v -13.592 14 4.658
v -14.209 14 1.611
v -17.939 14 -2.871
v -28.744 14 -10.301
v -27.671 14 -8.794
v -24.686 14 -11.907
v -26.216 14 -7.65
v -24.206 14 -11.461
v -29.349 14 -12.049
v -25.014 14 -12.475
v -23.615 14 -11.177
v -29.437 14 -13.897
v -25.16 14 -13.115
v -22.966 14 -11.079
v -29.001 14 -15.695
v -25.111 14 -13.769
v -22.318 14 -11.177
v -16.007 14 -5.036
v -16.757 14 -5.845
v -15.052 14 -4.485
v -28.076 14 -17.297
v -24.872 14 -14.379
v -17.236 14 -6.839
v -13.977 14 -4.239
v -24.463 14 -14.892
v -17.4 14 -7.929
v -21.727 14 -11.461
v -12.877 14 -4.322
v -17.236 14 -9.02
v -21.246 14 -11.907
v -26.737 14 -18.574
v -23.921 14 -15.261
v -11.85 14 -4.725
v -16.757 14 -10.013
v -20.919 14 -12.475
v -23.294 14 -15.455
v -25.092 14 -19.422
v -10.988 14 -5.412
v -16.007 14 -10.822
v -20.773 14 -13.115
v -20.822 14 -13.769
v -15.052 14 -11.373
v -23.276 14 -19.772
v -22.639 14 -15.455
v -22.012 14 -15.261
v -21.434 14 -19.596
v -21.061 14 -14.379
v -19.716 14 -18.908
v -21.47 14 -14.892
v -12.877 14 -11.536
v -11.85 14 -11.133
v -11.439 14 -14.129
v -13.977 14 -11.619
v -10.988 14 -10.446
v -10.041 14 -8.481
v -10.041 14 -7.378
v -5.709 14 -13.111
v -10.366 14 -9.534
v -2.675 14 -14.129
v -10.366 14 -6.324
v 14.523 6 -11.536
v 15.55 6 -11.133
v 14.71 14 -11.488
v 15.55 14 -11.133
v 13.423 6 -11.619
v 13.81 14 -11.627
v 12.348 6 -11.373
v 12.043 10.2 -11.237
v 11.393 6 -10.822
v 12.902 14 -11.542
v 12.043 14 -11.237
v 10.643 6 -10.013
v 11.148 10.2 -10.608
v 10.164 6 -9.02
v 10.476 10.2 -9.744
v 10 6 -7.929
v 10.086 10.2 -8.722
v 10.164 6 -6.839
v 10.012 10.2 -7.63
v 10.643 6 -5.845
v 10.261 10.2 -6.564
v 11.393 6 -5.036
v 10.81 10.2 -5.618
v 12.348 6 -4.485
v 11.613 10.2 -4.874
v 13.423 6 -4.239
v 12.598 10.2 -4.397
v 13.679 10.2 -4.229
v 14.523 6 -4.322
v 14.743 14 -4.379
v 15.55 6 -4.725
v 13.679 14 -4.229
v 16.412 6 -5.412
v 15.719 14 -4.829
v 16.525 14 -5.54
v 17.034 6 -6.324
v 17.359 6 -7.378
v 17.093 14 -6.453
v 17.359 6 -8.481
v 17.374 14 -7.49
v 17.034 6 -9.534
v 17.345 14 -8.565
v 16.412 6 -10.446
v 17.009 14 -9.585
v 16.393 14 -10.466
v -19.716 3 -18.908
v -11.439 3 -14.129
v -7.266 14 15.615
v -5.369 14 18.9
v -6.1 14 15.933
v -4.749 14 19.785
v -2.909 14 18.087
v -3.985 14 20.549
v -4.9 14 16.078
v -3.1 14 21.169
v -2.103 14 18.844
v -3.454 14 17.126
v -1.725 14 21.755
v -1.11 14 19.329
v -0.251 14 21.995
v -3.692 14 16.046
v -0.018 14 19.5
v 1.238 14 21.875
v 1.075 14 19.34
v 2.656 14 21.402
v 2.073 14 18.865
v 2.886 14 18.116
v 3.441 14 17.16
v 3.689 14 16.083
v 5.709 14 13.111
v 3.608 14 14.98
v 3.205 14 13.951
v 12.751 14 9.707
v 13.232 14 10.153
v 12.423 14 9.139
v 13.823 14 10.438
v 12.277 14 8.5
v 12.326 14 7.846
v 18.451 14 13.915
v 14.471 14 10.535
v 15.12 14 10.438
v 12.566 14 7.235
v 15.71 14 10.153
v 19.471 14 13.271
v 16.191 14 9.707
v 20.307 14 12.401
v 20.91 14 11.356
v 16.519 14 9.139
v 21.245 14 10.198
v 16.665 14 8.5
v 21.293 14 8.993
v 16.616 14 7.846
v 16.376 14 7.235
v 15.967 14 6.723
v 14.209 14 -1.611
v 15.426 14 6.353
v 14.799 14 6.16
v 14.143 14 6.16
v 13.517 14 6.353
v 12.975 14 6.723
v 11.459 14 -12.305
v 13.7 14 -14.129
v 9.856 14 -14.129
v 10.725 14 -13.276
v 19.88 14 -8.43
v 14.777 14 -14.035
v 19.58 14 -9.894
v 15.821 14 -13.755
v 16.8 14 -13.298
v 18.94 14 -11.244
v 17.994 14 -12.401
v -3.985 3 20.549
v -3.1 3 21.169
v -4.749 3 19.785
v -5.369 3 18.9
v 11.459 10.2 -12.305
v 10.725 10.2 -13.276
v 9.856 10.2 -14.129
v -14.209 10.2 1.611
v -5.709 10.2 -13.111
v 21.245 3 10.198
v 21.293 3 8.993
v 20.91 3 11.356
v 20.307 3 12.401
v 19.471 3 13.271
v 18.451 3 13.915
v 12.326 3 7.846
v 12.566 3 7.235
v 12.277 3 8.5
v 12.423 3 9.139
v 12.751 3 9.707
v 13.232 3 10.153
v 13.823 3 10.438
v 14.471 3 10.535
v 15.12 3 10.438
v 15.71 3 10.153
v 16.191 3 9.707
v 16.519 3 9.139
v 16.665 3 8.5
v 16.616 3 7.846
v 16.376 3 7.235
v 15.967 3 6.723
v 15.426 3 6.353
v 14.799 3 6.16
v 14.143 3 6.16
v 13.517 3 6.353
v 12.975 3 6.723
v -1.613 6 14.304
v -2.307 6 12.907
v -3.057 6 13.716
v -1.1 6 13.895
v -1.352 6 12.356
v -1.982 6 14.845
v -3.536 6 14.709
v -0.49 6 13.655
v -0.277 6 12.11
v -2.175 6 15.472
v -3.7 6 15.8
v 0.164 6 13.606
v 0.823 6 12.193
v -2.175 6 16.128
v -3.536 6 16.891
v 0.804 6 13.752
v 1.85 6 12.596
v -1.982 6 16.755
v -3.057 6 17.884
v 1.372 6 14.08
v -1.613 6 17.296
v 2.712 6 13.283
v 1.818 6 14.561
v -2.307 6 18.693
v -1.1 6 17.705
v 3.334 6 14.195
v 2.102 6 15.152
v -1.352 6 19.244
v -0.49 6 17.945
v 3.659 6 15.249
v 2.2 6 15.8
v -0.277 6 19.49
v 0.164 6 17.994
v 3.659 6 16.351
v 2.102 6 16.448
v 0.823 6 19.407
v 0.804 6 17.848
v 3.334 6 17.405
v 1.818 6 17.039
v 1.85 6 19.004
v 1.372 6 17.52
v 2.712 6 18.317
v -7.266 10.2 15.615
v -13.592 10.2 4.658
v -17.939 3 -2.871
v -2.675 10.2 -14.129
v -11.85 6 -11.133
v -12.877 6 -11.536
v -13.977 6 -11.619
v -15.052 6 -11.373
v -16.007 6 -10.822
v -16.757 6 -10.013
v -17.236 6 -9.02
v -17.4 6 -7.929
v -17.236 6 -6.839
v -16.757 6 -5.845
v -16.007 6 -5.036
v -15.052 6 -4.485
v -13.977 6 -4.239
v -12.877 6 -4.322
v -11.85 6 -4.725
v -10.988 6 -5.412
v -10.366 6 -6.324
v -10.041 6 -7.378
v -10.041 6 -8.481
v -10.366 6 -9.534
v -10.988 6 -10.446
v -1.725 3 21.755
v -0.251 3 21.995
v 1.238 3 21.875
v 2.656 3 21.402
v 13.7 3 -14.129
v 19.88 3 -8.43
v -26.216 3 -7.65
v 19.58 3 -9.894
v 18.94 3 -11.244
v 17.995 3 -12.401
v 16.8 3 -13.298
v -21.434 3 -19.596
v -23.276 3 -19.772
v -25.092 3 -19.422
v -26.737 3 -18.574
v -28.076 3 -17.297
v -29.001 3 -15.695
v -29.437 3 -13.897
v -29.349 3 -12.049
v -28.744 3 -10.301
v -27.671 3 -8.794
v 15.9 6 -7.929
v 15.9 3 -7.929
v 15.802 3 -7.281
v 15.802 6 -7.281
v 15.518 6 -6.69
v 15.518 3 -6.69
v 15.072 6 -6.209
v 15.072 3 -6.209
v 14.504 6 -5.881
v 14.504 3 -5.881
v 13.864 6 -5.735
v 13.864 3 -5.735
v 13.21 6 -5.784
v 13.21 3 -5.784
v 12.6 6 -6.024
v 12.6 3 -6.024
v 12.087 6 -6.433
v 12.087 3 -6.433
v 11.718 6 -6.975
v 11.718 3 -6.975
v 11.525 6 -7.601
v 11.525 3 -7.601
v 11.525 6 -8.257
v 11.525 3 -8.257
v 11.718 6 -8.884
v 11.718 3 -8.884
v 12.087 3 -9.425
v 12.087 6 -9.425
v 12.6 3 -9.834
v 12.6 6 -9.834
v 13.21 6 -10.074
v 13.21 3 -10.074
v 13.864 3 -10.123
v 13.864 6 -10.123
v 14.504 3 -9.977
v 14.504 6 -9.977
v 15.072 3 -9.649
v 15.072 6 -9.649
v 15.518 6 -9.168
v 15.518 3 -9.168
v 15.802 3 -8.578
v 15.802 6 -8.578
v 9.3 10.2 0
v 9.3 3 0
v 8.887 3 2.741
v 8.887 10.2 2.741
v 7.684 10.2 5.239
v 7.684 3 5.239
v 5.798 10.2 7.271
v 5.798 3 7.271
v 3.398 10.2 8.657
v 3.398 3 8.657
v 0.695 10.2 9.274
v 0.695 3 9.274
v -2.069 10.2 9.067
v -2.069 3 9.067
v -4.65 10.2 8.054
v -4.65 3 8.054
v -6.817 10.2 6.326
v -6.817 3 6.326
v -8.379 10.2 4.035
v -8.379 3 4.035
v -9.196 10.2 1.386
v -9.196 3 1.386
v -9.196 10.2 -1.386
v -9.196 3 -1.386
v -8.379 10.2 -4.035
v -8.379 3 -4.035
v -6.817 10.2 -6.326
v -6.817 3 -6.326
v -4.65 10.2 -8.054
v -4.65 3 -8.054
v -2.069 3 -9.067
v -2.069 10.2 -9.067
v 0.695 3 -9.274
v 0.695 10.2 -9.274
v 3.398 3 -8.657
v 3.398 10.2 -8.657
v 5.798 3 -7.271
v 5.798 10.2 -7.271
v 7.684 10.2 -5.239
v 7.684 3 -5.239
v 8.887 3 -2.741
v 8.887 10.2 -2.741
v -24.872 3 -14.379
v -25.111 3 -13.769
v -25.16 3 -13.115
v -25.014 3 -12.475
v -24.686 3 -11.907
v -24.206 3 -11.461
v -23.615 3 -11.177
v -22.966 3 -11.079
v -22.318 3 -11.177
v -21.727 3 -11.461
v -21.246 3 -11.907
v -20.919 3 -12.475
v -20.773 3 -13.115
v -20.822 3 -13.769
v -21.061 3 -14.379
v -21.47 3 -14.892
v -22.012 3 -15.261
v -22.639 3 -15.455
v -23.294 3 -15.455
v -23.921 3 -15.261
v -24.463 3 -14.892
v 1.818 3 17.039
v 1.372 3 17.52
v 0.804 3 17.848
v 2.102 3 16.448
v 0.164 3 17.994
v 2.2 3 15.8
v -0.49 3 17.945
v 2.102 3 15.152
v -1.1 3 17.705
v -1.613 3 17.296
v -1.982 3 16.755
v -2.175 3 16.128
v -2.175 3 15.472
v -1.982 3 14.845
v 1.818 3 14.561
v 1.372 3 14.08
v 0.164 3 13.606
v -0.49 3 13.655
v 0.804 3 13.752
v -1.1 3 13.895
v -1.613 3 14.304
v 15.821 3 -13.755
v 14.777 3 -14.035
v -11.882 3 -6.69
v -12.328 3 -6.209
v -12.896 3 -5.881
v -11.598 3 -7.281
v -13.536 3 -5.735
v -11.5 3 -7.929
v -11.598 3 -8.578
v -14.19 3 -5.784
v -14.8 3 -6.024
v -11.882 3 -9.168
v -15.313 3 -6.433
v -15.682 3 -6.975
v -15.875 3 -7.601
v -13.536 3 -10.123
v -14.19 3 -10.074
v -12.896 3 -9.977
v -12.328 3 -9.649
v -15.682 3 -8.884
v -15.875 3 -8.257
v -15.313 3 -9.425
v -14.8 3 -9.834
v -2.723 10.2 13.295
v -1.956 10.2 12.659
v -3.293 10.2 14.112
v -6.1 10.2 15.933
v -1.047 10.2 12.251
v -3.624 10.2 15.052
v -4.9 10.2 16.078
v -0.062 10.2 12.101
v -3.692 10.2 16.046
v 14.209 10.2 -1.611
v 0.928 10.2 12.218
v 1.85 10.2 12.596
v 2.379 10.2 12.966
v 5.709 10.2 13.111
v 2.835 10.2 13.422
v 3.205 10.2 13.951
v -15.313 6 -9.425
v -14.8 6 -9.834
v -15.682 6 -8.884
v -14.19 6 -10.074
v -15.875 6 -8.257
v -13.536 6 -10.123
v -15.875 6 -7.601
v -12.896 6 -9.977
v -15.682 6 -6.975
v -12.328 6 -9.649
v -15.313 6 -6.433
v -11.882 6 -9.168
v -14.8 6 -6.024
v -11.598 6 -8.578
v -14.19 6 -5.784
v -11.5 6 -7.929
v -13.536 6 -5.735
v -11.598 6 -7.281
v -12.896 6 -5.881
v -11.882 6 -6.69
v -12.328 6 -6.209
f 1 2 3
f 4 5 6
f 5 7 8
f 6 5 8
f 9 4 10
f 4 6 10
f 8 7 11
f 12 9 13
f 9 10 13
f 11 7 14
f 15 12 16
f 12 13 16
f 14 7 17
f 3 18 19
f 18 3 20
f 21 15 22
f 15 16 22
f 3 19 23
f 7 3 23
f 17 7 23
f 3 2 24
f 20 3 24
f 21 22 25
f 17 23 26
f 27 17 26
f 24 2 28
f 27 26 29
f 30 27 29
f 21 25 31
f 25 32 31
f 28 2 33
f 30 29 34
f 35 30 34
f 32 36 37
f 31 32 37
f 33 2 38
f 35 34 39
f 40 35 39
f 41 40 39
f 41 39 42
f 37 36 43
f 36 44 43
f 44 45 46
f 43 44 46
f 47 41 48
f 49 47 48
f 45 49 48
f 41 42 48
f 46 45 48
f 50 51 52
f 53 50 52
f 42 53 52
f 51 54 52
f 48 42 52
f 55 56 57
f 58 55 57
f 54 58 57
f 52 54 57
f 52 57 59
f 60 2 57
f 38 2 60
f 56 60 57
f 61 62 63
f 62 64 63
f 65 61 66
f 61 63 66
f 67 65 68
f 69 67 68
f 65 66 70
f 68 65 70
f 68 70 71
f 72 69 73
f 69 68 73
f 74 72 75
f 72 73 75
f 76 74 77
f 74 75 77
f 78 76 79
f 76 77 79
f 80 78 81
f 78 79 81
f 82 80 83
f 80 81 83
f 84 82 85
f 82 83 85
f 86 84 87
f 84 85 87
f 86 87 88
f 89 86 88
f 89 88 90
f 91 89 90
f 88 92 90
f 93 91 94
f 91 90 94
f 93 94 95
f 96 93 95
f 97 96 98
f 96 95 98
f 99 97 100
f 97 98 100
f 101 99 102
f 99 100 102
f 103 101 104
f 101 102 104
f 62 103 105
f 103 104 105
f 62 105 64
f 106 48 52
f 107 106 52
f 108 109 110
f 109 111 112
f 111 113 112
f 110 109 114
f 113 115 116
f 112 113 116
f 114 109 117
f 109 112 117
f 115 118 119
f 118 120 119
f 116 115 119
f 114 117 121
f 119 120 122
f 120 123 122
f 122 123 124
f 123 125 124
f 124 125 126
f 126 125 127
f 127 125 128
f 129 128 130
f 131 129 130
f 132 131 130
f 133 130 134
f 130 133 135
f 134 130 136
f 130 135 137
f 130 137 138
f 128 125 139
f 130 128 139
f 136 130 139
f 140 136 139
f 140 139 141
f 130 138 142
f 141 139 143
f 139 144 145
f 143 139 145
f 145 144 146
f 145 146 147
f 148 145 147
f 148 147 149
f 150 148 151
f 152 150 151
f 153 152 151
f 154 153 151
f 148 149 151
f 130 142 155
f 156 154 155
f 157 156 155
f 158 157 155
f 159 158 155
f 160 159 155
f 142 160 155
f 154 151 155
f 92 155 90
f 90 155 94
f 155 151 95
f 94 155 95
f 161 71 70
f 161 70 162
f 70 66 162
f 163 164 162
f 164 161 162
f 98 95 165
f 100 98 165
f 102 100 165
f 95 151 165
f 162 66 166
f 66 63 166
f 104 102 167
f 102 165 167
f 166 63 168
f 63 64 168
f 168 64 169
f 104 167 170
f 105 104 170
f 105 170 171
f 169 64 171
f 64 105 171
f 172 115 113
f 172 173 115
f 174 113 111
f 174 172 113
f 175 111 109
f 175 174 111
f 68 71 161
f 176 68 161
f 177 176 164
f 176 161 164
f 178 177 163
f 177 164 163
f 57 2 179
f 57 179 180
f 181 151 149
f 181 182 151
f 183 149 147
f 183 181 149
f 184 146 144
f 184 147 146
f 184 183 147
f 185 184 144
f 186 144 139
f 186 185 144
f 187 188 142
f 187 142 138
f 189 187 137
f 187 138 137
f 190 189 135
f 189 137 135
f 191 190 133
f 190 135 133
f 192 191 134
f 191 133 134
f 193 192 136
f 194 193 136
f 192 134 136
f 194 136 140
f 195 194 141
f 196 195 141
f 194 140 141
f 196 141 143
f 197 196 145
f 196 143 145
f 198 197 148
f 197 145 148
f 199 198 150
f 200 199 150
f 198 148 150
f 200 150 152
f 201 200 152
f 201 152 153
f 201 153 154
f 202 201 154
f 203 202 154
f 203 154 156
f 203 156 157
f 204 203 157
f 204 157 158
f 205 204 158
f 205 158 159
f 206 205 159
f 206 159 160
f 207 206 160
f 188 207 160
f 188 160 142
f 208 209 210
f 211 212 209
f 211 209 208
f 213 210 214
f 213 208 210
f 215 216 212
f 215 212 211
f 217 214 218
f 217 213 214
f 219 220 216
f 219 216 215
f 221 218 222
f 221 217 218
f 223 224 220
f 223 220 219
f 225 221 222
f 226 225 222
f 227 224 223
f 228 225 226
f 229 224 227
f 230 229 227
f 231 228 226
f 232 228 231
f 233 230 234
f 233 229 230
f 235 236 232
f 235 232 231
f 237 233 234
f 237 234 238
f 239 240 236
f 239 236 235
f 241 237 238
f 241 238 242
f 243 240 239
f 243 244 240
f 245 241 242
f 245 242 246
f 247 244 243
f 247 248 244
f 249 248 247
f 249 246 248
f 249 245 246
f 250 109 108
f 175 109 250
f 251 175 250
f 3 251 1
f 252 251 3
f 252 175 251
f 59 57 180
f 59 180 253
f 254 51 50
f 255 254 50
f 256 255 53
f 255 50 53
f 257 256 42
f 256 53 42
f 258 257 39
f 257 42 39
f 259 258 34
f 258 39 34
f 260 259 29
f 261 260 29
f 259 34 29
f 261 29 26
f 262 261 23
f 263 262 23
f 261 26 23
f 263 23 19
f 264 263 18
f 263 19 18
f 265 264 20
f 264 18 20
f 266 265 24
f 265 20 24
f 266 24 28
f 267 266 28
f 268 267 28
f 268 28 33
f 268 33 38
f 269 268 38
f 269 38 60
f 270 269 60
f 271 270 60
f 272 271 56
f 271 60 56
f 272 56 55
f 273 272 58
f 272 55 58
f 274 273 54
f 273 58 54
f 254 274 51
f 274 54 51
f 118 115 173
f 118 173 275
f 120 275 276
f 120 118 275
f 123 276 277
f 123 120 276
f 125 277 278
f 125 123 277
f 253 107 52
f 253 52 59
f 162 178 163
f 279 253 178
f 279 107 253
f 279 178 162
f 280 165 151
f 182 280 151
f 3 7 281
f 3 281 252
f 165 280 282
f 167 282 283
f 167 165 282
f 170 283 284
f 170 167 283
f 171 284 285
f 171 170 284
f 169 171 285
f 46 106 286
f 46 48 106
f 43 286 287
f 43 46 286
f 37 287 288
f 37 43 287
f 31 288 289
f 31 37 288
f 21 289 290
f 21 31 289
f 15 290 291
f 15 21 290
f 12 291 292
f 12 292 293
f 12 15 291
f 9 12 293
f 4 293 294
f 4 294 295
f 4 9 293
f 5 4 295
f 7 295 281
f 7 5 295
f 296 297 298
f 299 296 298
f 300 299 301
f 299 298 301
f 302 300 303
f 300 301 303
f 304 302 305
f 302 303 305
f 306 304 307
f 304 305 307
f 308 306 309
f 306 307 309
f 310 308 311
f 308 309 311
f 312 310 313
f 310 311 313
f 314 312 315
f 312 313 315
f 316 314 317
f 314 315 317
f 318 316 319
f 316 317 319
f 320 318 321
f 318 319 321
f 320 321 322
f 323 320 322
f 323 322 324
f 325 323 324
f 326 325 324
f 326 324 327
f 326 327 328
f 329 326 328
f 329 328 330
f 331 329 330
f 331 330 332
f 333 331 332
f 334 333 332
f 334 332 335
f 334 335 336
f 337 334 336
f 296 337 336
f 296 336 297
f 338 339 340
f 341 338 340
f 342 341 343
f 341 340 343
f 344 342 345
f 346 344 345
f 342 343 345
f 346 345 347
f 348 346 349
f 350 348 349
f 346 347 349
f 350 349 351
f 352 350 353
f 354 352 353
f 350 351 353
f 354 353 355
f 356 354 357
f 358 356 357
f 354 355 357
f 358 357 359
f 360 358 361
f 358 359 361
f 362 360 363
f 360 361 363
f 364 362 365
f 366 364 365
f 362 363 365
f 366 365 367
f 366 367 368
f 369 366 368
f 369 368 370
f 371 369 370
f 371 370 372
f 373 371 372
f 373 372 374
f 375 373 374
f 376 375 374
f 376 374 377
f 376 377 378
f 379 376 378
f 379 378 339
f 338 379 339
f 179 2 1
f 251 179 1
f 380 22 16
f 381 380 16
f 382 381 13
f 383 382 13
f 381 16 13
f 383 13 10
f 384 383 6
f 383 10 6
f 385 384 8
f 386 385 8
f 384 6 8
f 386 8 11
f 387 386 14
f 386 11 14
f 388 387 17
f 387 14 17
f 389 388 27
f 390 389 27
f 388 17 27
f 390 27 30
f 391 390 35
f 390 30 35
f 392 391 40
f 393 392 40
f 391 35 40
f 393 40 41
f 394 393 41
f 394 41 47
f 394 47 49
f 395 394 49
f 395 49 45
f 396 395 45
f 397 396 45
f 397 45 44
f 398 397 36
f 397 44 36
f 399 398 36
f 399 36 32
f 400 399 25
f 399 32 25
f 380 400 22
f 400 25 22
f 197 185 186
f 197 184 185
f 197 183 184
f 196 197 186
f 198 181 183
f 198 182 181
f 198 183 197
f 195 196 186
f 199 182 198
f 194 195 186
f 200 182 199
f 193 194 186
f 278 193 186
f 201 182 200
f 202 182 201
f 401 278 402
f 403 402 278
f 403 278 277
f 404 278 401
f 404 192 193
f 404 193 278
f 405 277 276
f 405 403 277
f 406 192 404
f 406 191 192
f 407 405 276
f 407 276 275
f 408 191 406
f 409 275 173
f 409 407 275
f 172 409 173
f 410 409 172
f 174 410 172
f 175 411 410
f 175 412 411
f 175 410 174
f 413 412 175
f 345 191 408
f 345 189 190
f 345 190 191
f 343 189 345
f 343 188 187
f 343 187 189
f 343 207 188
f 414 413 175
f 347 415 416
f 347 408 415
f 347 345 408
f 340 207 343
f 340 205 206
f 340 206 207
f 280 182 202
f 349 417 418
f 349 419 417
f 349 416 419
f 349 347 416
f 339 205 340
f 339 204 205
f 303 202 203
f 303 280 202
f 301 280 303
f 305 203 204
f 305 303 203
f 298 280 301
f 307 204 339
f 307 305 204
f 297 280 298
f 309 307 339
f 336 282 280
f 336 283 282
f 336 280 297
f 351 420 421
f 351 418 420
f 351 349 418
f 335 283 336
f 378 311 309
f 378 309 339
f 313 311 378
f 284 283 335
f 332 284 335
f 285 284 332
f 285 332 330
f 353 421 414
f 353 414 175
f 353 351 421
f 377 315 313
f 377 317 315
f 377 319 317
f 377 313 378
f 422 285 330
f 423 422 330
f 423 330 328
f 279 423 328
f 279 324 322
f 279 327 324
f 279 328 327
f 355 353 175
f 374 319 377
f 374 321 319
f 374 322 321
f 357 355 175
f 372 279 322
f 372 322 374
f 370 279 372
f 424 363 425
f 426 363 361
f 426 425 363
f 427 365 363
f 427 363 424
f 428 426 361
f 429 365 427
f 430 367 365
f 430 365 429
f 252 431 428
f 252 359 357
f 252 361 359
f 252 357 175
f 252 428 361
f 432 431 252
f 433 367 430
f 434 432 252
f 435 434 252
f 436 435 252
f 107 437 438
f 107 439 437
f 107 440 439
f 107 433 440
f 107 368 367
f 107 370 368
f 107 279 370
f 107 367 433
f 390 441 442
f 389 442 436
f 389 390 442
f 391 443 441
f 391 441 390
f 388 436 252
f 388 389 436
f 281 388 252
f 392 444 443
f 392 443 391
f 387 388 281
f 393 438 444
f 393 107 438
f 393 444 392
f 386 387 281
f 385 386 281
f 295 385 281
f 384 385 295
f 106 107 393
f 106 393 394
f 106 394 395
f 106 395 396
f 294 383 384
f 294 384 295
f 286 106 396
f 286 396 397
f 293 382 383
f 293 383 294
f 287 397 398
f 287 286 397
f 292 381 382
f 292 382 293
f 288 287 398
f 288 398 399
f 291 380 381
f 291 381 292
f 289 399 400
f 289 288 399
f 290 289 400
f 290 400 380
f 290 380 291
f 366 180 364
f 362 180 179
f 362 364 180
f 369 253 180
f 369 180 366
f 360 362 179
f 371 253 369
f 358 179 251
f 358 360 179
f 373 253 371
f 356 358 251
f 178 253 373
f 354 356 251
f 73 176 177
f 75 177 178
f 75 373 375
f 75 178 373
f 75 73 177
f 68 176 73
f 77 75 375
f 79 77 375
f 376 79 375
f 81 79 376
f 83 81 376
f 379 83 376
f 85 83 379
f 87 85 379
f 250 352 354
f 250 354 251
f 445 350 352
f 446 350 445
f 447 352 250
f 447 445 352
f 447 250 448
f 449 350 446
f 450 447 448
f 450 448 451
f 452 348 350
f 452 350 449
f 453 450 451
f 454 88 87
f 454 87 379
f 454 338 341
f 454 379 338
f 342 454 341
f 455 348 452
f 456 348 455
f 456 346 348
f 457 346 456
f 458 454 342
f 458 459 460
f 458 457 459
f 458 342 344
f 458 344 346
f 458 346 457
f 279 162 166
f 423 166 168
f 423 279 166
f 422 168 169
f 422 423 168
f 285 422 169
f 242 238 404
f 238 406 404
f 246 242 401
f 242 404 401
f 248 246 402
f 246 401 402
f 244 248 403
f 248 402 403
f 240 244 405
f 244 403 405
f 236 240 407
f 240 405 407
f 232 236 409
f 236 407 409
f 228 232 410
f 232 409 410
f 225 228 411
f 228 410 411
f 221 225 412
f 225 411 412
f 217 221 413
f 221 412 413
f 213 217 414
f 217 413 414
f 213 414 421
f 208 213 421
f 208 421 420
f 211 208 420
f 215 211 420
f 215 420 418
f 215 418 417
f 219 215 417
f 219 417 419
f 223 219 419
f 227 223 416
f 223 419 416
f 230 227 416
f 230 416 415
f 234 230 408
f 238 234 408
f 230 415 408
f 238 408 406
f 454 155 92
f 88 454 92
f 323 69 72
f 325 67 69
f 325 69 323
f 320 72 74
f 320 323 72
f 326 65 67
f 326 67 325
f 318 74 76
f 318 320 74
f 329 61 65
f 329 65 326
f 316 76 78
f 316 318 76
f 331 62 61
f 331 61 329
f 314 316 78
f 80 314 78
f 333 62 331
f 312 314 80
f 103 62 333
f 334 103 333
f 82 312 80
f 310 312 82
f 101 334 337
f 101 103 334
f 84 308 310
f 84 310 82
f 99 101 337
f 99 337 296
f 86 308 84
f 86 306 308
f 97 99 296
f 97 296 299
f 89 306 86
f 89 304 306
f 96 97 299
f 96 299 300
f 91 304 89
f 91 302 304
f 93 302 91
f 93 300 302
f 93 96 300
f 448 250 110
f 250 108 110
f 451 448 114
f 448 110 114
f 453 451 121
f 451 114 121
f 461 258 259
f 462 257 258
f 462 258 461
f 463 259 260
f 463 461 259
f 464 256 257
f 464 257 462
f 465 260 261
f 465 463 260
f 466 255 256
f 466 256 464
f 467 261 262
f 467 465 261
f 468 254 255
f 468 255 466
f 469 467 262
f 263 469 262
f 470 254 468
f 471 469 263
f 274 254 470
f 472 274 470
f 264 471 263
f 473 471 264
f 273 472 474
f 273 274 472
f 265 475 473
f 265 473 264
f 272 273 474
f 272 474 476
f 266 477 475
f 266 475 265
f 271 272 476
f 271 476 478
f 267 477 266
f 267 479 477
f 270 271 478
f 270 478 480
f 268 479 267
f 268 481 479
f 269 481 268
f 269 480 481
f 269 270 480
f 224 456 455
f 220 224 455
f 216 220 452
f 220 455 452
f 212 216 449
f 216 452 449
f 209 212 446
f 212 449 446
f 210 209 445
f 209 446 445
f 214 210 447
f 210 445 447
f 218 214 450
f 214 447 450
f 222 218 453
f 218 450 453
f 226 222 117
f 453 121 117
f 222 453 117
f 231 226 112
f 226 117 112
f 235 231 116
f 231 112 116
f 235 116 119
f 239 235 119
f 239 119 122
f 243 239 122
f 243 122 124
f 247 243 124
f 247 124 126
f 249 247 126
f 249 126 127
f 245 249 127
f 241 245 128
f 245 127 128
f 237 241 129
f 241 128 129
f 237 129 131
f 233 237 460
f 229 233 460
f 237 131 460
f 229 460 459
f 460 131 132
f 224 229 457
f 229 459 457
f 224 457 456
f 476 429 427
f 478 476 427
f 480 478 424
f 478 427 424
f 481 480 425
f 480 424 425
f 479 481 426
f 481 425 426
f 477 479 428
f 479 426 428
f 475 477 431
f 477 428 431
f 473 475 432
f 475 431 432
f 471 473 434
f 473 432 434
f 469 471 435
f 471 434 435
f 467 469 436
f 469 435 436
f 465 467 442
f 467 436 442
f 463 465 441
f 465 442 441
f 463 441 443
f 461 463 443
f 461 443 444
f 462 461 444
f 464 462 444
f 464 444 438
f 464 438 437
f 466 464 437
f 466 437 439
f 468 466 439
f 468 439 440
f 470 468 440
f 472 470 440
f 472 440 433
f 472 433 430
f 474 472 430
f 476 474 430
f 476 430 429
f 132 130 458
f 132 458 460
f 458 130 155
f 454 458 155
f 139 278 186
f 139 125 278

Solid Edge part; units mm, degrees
sketch "Sketch1" plane through (0, 0, 0) normal (0, -1, 0) x (1, 0, 0)
  line L0 (-5.3694, 18.9) -> (-19.0694, -4.8291)
  arc A0 (-13.7, -14.1291) -> (-19.0694, -4.8291) centre (-13.7, -7.9291) cw
  line L1 (-13.7, -14.1291) -> (13.7, -14.1291)
  arc A1 (19.0694, -4.8291) -> (13.7, -14.1291) centre (13.7, -7.9291) cw
  line L2 (5.3694, 18.9) -> (19.0694, -4.8291)
  arc A2 (-5.3694, 18.9) -> (5.3694, 18.9) centre (0, 15.8) cw
  dimension "D1" = 5.3694
extrude "Protrusion1" add sketch "Sketch1" against normal blind 14
sketch "Sketch2" plane through (0, 0, 0) normal (0, -1, 0) x (1, 0, 0)
  circle A0 centre (-13.7, -7.9291) radius 2.2
  circle A1 centre (13.7, -7.9291) radius 2.2
  circle A2 centre (0, 15.8) radius 2.2
  dimension "D1" = 37.2
  dimension "D2" = 4
  dimension "D3" = 4.4
  dimension "D4" = 6.2
  dimension "D5" = 6.2
  dimension "D6" = 4.4
  dimension "D7" = 6.2
  dimension "D8" = 27.4
  dimension "D9" = 27.4
  dimension "D10" = 27.4
extrude "Cutout1" cut sketch "Sketch2" against normal blind 457.8755
sketch "Sketch3" plane through (0, 0, 0) normal (0, -1, 0) x (1, 0, 0)
  circle A0 centre (0, 0) radius 9.3
extrude "Cutout2" cut sketch "Sketch3" against normal blind 434.4917
sketch "Sketch4" plane through (0, 0, 3.9355) normal (0, -1, 0) x (-0.5, 0, 0.8660254)
  line L0 (-23.325, -5.9323) -> (-23.325, -18.9323)
  line L1 (-23.325, -18.9323) -> (16.475, -18.9323)
  line L2 (16.475, -18.9323) -> (16.475, -5.9323)
  line L3 (12.7755, -8.7037) -> (16.475, -5.9323)
  line L4 (-20.9306, -8.7037) -> (12.7755, -8.7037)
  line L5 (-20.9306, -5.9323) -> (-20.9306, -8.7037)
  line L6 (-23.325, -5.9323) -> (-20.9306, -5.9323)
  dimension "D1" = 13
extrude "Protrusion2" add sketch "Sketch4" against normal up to vertex (14 mm away)
sketch "Sketch5" plane through (18.1083, 8, 10.4355) normal (0.8660254, 0, 0.5) x (-0.5, 0, 0.8660254)
  line L0 (-19.9, 8) -> (19.9, 8)
  line L1 (19.9, -6) -> (19.9, 8)
  line L2 (-19.9, -6) -> (19.9, -6)
  line L3 (-19.9, -6) -> (-19.9, 8)
extrude "ExtrudedProtrusion_14" add sketch "Sketch5" along normal blind 4
sketch "Sketch6" plane through (5.8112, 14, 7.7701) normal (0, 1, 0) x (0.5, 0, -0.8660254)
  circle A0 centre (3.8403, 24.7468) radius 3.7
  circle A1 centre (17.5403, 1.0177) radius 3.7
  circle A2 centre (-9.8597, 1.0177) radius 3.7
extrude "Cutout3" cut sketch "Sketch6" against normal blind 8
sketch "Sketch7" plane through (11.8615, 14, 7.7701) normal (0, 1, 0) x (-0.8660254, 0, -0.5)
  circle A0 centre (-2.5426, -0.8152) radius 2.2
  dimension "D1" = 6
  dimension "D2" = 39.8
  dimension "D3" = 19.9
  dimension "D4" = 4.4
extrude "ExtrudedCutout_23" cut sketch "Sketch7" against normal blind 166.5817
sketch "Sketch8" plane through (11.8615, 14, 7.7701) normal (0, 1, 0) x (-0.8660254, 0, -0.5)
  circle A0 centre (40.6865, -0.8152) radius 2.2
  line L0 (40.6865, 5.6848) -> (31.1282, 5.6848)
  line L1 (31.1282, 5.6848) -> (31.1282, 3.8832)
  line L2 (31.1282, 3.8832) -> (34.2429, 1.8592)
  line L3 (34.2429, 1.8592) -> (34.2429, -2.6486)
  line L4 (31.1282, -7.3152) -> (34.2429, -2.6486)
  line L5 (40.6865, -7.3152) -> (31.1282, -7.3152)
  arc A1 (40.6865, -7.3152) -> (40.6865, 5.6848) centre (40.6865, -0.8152) ccw
extrude "Protrusion3" add sketch "Sketch8" against normal up to vertex (14 mm away)
sketch "Sketch9" plane through (11.8615, 14, 7.7701) normal (0, 1, 0) x (-0.8660254, 0, -0.5)
  line L0 (-10.7426, -0.8152) -> (-10.7426, -20.7152)
  line L1 (-10.7426, -20.7152) -> (6.2574, -20.7152)
  arc A0 (1.1563, -18.0392) -> (6.2574, -20.7152) centre (6.2574, -14.5152) ccw
  line L2 (1.1563, -18.0392) -> (-10.7426, -0.8152)
extrude "Cutout4" cut sketch "Sketch9" against normal blind 85.4791
sketch "Sketch10" plane through (6.8865, 14, 7.7701) normal (0, 1, 0) x (-0.8660254, 0, -0.5)
  line L0 (-15.0511, 16.5973) -> (-15.0511, -3.3027)
  line L1 (-3.1522, 13.9213) -> (-15.0511, -3.3027)
  arc A0 (1.9489, 16.5973) -> (-3.1522, 13.9213) centre (1.9489, 10.3973) ccw
  line L2 (1.9489, 16.5973) -> (-15.0511, 16.5973)
extrude "ExtrudedCutout_27" cut sketch "Sketch10" against normal blind 118.3722
sketch "Sketch11" plane through (0, 0, 0) normal (0, 0, 1) x (1, 0, 0)
  line L0 (-57, 0) -> (32.4619, 0)
  line L1 (32.4619, 0) -> (32.4619, 3)
  line L2 (32.4619, 3) -> (-57, 3)
  line L3 (-57, 3) -> (-57, 0)
  dimension "D1" = 3
extrude "Cutout5" cut sketch "Sketch11" along normal mid plane 82.8276
sketch "Sketch12" plane through (11.8615, 14, 7.7701) normal (0, 1, 0) x (-0.8660254, 0, -0.5)
  line L0 (2.6574, 7.7016) -> (2.6574, -9.2984)
  line L1 (2.6574, -9.2984) -> (7.9574, -15.2984)
  arc A0 (20.3574, -15.2984) -> (7.9574, -15.2984) centre (14.1574, -9.8217) cw
  line L2 (25.6574, -9.2984) -> (20.3574, -15.2984)
  line L3 (25.6574, 7.7016) -> (25.6574, -9.2984)
  line L4 (25.6574, 7.7016) -> (20.3574, 13.7016)
  arc A1 (7.9574, 13.7016) -> (20.3574, 13.7016) centre (14.1574, 8.2249) cw
  line L5 (2.6574, 7.7016) -> (7.9574, 13.7016)
  dimension "D1" = 11.5
  dimension "D2" = 11.5
  dimension "D3" = 6.2
  dimension "D4" = 6.2
  dimension "D5" = 8.5
  dimension "D6" = 8.5
  dimension "D7" = 8.5
  dimension "D8" = 8.5
  dimension "D9" = 6
  dimension "D10" = 6
  dimension "D11" = 6
  dimension "D12" = 6
extrude "Cutout6" cut sketch "Sketch12" against normal blind 3.8
fillet "Round_2" radius 5 1 edges at (21.5724, 8.5, 12.4355)
